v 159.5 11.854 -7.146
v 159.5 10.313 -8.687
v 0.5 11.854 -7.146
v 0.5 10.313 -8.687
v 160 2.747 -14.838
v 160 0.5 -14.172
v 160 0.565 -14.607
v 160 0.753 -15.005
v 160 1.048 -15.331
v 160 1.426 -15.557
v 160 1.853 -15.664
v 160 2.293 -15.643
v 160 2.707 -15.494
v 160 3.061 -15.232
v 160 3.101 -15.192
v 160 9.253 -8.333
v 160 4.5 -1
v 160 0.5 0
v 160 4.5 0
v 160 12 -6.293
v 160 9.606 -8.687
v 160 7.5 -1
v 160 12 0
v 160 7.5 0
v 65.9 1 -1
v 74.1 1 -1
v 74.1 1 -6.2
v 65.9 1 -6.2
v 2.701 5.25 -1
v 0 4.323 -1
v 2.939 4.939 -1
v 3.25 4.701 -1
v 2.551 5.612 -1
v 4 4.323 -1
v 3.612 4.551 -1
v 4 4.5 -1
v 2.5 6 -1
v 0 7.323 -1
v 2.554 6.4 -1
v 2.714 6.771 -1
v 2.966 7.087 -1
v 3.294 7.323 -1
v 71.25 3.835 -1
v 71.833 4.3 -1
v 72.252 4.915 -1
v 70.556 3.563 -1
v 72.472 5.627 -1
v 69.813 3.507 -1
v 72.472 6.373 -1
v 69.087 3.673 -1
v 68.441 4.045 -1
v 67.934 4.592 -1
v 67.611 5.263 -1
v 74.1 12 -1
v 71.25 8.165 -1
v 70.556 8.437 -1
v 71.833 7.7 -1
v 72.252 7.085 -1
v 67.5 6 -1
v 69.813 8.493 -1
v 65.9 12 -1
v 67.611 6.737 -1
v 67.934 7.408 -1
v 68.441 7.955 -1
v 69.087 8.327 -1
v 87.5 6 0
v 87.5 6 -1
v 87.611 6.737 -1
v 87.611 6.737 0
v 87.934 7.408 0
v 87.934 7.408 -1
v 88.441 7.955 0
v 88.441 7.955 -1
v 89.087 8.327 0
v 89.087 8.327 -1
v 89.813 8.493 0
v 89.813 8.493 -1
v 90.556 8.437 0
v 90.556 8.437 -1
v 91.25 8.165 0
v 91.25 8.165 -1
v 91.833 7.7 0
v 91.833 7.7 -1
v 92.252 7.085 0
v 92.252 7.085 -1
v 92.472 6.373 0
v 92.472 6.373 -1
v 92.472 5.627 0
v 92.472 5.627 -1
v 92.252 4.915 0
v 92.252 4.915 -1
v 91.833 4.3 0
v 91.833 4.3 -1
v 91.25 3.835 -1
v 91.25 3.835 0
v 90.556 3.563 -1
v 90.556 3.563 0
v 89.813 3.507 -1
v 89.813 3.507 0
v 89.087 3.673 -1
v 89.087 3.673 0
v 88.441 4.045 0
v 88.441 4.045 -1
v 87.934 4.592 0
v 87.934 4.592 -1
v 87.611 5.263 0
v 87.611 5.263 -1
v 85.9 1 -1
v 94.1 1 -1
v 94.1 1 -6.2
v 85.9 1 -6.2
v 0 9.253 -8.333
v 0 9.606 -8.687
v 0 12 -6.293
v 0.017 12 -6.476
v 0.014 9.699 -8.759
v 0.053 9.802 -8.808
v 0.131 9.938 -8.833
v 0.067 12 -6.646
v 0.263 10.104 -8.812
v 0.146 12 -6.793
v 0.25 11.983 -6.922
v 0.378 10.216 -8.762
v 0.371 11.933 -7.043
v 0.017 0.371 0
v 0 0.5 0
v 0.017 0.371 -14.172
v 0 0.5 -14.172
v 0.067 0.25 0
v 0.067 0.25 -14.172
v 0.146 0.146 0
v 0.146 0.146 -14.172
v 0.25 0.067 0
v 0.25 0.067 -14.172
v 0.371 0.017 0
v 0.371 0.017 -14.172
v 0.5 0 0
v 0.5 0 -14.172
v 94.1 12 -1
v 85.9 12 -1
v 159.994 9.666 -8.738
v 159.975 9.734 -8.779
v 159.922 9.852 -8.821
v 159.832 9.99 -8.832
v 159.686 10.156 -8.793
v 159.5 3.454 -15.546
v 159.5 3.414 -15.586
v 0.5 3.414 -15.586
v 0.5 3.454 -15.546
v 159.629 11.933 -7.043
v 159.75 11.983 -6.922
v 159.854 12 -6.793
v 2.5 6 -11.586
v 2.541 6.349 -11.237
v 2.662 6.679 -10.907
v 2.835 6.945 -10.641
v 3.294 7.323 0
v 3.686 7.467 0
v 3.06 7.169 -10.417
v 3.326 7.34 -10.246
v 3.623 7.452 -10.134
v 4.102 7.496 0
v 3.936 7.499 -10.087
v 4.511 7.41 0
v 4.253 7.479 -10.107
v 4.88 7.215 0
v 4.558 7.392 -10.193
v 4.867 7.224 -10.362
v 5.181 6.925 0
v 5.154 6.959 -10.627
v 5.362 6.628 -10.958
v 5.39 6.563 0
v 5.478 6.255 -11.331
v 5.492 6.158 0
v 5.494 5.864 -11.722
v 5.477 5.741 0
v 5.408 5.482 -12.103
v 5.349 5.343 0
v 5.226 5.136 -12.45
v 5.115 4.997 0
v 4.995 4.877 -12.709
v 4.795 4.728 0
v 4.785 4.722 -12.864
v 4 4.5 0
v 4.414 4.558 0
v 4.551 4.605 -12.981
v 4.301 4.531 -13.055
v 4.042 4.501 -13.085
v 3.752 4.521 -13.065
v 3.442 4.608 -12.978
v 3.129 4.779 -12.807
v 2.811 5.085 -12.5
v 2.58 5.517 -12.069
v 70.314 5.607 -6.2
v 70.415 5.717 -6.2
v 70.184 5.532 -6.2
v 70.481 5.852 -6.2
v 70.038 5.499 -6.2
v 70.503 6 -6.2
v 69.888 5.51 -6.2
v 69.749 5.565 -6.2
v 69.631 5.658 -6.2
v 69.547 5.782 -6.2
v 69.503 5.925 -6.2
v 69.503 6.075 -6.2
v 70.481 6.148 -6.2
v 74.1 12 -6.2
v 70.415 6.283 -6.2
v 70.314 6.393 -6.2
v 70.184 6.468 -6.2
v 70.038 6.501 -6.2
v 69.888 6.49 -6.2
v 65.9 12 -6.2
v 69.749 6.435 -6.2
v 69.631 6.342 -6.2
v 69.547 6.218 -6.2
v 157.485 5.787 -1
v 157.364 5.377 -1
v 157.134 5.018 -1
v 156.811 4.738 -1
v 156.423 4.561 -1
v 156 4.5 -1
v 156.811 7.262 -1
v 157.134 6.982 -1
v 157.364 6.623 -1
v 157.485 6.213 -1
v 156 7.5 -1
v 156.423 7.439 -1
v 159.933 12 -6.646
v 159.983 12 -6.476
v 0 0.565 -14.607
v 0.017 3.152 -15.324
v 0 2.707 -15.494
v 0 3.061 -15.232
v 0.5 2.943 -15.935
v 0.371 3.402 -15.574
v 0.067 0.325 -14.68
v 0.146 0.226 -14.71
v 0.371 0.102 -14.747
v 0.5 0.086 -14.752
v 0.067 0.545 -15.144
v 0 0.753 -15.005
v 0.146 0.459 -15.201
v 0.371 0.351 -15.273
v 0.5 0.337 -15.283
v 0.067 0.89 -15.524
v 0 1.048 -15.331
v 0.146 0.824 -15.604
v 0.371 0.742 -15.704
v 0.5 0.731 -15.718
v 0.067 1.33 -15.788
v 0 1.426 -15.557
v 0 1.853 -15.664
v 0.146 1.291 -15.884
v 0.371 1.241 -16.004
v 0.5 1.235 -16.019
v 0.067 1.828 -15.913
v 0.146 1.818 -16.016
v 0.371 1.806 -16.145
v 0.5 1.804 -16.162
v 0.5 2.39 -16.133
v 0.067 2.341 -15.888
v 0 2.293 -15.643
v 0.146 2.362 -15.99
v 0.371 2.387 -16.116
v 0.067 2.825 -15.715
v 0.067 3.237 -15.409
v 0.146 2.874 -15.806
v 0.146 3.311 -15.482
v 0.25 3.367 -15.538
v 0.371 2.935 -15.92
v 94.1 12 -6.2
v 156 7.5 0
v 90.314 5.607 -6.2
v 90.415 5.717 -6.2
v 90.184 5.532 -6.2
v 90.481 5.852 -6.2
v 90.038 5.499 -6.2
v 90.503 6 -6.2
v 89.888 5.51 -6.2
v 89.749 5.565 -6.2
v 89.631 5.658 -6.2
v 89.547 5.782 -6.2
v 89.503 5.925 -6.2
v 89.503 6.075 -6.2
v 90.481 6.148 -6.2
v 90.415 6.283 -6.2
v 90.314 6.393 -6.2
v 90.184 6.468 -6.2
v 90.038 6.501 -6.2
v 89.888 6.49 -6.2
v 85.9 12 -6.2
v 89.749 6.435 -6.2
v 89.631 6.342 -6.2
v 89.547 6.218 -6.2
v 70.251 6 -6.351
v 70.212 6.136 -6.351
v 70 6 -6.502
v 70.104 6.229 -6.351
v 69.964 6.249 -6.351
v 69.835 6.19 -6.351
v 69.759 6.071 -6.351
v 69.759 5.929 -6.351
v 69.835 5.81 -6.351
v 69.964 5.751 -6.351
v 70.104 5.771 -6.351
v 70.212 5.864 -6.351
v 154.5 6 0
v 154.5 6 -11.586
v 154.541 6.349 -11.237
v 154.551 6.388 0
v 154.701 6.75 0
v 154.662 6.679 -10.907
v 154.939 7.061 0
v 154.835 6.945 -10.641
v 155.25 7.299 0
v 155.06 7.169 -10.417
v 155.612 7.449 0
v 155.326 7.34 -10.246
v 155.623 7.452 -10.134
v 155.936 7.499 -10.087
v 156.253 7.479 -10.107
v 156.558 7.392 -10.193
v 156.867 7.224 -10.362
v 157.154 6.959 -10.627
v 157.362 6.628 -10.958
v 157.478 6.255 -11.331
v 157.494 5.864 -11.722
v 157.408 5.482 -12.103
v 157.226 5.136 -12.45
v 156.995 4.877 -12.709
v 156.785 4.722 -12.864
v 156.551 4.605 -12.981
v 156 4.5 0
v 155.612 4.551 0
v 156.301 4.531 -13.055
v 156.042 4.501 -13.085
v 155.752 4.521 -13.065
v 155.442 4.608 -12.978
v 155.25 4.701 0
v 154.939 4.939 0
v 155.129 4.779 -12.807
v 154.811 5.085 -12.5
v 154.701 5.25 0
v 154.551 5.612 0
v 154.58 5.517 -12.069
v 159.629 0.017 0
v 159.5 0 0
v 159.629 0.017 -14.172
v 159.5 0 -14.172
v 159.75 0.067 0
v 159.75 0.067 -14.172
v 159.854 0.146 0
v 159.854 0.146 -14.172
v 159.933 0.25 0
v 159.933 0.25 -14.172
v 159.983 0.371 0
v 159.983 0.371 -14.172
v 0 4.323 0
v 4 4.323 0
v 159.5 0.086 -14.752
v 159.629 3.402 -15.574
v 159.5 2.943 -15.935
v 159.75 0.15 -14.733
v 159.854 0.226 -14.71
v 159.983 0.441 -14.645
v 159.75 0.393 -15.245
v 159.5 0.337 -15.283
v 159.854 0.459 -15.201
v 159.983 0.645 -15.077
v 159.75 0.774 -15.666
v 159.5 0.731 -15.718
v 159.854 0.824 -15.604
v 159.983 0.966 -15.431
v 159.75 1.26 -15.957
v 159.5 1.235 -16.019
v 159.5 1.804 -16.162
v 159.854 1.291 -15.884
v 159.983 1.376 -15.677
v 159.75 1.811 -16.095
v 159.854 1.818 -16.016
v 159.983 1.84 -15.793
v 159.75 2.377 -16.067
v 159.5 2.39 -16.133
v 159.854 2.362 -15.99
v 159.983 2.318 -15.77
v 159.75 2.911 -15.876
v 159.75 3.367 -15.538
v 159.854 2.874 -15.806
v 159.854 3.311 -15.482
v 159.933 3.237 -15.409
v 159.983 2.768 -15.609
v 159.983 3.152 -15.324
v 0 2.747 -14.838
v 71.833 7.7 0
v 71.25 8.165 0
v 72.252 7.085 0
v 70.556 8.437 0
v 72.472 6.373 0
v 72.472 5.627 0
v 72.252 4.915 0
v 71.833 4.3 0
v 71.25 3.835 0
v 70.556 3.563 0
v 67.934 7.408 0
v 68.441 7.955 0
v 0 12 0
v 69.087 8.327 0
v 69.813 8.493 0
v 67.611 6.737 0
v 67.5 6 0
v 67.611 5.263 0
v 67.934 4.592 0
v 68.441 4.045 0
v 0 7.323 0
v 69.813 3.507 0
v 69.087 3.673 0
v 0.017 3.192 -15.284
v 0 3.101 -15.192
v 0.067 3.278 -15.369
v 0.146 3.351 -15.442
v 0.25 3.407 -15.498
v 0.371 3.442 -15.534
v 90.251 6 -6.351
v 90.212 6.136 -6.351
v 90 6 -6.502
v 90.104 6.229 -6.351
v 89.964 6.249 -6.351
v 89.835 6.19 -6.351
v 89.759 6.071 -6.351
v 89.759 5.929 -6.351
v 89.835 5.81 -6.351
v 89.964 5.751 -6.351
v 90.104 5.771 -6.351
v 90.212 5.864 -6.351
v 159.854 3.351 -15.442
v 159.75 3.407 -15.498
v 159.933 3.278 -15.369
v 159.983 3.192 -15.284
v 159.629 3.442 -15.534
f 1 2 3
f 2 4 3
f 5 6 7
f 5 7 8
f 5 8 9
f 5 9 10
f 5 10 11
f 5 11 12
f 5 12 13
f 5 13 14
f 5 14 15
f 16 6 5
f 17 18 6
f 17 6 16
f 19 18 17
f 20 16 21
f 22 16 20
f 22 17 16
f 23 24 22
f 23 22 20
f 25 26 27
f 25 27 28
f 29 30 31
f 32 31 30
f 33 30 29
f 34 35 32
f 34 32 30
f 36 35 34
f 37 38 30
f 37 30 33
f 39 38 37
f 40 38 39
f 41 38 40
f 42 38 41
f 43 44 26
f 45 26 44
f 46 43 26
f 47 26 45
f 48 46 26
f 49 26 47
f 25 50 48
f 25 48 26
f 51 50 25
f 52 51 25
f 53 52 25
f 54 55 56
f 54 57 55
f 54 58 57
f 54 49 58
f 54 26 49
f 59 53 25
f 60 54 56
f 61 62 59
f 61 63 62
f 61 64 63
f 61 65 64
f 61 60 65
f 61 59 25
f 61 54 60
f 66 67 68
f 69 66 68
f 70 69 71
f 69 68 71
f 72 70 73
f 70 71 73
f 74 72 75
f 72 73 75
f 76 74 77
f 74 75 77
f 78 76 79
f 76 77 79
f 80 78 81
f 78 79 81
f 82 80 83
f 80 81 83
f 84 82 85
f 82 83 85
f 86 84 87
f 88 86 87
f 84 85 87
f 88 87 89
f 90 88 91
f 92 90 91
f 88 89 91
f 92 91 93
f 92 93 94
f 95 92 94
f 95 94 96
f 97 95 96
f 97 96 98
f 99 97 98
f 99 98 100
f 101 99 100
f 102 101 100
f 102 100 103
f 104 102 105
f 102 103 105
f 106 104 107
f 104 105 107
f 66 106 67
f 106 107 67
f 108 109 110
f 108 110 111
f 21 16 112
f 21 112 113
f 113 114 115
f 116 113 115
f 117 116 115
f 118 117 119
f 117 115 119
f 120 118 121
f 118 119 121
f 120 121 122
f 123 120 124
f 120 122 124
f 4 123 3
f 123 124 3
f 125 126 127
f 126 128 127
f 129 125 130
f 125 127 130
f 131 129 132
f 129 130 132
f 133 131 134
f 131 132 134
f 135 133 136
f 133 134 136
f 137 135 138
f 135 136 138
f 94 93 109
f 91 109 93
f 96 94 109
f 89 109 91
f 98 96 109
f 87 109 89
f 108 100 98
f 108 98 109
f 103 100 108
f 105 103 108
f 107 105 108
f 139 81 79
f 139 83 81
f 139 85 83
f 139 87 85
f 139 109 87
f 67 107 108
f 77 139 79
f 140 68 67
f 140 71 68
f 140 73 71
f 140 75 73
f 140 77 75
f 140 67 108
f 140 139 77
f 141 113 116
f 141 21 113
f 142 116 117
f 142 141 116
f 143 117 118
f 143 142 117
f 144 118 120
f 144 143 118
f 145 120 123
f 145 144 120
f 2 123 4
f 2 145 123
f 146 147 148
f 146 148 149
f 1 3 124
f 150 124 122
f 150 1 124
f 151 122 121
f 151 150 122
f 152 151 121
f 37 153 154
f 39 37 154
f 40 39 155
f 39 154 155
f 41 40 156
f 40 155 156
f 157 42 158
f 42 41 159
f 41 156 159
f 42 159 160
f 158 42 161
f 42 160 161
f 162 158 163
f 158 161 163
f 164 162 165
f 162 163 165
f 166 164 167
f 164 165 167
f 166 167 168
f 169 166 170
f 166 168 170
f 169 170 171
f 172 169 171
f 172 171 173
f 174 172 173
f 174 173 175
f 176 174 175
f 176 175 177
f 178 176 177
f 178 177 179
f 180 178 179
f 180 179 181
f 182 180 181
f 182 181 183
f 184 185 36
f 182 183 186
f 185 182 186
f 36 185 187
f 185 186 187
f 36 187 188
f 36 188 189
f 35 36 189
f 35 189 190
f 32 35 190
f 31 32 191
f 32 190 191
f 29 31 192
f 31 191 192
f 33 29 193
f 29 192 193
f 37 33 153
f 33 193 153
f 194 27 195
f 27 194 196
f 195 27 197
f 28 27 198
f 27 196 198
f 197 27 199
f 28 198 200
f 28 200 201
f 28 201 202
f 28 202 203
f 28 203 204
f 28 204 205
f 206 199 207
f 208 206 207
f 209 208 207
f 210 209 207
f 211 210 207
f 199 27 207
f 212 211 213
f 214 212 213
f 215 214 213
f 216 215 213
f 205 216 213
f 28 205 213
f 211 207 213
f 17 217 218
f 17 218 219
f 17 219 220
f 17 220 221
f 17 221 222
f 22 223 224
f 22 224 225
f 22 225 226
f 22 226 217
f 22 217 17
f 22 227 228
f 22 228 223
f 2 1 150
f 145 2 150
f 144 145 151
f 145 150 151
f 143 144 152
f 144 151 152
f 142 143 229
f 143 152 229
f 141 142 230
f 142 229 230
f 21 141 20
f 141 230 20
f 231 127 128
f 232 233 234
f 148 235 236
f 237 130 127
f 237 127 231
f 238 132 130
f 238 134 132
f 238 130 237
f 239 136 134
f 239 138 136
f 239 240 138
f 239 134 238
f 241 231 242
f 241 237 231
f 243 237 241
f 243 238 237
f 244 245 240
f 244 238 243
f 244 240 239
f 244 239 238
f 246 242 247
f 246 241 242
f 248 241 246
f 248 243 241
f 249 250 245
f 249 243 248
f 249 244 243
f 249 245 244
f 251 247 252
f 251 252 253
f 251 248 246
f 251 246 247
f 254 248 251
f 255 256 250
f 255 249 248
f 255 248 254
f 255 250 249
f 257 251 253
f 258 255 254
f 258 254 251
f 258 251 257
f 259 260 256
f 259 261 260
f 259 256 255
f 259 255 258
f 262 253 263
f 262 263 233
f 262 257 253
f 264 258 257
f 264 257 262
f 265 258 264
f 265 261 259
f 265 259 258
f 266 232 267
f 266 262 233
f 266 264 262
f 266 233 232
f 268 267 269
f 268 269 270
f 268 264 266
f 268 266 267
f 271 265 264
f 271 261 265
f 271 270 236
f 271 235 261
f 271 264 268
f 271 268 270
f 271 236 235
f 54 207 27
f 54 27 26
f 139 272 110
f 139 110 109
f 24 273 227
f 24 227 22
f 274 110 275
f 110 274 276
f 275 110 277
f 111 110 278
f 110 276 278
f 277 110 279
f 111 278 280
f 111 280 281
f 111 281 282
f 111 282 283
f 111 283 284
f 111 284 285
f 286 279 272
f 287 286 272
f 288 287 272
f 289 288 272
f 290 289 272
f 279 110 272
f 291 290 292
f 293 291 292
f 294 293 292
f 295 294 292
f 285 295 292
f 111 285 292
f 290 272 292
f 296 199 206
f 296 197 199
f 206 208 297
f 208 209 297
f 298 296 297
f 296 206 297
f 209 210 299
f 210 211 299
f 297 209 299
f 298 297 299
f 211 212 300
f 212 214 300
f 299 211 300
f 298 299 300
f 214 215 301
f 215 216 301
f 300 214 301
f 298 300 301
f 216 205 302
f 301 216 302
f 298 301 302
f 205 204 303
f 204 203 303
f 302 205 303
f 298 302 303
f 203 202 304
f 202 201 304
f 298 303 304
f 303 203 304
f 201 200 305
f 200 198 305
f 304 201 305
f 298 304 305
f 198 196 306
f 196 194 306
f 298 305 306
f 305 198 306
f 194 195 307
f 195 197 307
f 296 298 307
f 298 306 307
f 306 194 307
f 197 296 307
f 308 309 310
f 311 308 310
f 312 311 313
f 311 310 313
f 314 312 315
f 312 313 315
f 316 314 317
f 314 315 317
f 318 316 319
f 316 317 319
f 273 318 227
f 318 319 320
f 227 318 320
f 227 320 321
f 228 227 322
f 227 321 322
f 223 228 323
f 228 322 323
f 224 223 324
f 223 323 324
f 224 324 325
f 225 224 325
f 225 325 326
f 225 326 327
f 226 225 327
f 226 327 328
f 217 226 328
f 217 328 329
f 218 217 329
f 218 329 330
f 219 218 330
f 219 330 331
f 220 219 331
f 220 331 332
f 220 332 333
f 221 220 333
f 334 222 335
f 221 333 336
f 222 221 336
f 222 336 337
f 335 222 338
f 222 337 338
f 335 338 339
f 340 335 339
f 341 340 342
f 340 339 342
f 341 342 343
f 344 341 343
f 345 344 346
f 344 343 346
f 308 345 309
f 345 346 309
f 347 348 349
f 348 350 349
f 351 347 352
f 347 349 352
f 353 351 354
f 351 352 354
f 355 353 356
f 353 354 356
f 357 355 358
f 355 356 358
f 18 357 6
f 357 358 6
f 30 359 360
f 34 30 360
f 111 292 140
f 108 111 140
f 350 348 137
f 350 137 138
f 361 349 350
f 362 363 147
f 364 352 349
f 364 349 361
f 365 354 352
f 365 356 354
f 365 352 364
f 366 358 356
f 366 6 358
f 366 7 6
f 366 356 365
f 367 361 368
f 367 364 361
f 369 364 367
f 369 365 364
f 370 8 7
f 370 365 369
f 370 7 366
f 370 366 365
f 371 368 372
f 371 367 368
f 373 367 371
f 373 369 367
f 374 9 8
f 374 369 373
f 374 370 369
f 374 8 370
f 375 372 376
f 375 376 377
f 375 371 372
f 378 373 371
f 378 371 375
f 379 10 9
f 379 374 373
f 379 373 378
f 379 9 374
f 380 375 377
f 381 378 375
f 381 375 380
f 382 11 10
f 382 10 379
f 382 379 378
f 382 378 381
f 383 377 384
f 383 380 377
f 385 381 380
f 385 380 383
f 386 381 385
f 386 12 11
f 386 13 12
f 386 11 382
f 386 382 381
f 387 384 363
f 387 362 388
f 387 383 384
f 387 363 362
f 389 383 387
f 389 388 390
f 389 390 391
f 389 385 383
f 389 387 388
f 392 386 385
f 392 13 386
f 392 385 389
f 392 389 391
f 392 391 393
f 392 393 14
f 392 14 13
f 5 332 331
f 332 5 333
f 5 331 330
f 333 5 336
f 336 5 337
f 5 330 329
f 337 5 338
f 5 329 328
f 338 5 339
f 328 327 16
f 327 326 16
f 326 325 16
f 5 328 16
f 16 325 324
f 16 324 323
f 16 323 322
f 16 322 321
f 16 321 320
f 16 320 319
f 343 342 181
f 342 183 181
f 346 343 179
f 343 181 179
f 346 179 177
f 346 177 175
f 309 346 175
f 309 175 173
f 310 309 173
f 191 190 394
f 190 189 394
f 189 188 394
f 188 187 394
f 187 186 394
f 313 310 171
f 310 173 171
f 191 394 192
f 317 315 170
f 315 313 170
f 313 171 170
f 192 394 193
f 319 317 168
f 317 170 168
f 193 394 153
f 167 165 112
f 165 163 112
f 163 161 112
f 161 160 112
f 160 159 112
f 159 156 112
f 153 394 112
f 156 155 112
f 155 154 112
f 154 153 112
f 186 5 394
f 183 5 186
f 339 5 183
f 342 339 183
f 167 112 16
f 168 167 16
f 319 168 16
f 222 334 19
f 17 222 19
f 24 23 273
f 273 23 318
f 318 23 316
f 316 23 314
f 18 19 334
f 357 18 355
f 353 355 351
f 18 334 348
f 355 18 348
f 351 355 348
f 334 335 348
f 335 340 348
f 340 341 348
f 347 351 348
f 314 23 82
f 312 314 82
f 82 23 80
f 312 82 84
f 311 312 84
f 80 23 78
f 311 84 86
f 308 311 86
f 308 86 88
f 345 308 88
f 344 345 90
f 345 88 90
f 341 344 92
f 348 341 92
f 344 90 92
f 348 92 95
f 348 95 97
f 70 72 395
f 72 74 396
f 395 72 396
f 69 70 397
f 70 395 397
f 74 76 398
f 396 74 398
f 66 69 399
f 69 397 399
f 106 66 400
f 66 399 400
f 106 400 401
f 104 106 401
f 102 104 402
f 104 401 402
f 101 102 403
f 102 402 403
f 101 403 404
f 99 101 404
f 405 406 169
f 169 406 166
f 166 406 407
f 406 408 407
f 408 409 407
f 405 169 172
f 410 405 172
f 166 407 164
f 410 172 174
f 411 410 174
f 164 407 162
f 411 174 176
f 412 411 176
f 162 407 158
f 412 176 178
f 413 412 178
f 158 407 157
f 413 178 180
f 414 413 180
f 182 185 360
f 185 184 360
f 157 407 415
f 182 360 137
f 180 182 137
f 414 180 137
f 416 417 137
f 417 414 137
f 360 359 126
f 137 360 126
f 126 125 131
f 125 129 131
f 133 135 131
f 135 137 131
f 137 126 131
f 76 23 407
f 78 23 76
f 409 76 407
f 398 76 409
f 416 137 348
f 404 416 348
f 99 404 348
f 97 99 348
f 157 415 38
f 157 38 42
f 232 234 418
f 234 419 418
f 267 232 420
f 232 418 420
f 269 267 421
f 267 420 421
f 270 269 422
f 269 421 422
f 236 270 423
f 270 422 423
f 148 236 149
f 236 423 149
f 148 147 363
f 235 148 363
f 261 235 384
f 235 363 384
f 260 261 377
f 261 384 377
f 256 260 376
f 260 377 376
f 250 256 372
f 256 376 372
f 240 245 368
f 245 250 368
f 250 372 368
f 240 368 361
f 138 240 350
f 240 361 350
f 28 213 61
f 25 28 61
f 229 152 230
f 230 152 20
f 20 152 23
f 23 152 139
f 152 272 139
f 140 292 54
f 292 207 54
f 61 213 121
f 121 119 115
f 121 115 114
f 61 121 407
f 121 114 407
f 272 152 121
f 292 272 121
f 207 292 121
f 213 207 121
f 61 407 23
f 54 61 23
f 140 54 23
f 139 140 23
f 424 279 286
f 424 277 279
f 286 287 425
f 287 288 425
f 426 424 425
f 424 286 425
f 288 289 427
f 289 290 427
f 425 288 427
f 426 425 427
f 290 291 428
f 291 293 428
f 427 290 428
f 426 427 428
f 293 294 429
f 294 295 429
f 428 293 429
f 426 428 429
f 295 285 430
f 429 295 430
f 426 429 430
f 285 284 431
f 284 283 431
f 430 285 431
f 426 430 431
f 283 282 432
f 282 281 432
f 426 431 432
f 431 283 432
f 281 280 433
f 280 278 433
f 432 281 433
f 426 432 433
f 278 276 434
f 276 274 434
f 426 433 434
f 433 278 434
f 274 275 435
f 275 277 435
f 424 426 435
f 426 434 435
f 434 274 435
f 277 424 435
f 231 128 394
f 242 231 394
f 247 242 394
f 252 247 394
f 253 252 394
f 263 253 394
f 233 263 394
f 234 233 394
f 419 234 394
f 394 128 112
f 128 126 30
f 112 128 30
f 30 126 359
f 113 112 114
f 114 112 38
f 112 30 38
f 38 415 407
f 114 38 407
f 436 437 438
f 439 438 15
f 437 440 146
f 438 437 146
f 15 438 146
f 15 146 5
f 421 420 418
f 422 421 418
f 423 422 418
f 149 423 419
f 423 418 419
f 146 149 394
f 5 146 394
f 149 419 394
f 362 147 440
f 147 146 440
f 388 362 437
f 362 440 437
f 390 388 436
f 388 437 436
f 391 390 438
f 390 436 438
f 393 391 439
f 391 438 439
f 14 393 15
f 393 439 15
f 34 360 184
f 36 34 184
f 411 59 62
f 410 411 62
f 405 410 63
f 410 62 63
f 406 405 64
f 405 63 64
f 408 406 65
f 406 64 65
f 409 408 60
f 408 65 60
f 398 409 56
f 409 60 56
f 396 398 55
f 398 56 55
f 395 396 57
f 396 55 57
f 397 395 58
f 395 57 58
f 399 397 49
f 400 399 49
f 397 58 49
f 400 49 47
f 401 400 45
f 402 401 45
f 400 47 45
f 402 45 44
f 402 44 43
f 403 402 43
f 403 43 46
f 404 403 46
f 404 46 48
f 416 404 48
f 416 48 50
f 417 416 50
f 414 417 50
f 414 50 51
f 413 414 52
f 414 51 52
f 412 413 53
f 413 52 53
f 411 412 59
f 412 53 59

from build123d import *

# Parameters (mm, degrees)
F1_DEPTH = 160
F3_D     = 5
F3_DEPTH = 5
F3_TIP   = 1.5021515476
F4_W     = 8.2
F4_H     = 5.2
F5_DEPTH = 11
F7_D     = 3
F6_W     = 4
F6_H     = 3
F8_DEPTH = 1
F9_R     = 2
F10_R    = 0.5


# Not quite as in the source:
# - a feature names something its author has since deleted; it is built from what else it names


with BuildPart() as f1:
    # F0 (on Right) → F1 (new body)
    with BuildSketch(Plane.YZ):
        Polygon((9.9597979746, -9.0402020254), (12, -7), (12, 0), (0, 0), (0, -6.5), (0, -19), (3.4544155877, -15.5455844123), (2.7473088065, -14.8384776311), (9.2526911935, -8.3330952442), align=None)
    extrude(amount=F1_DEPTH)

    # F3
    with Locations(Plane.XY):
        with Locations((90, 6), (70, 6)):
            Hole(F3_D / 2, depth=F3_DEPTH)
            with Locations((0, 0, -(F3_DEPTH + F3_TIP / 2))):  # 118° drill point
                Cone(0, F3_D / 2, F3_TIP, mode=Mode.SUBTRACT)

    # F4 (on face) → F5 (cut)
    with BuildSketch(Plane(origin=(0, 12, 0), x_dir=(-1, 0, 0), z_dir=(0, 1, 0))):
        with Locations((-90, -3.6)):
            Rectangle(F4_W, F4_H)
        with Locations((-70, -3.6)):
            Rectangle(F4_W, F4_H)
    extrude(amount=-F5_DEPTH, mode=Mode.SUBTRACT)

    # F7 (through all)
    with Locations(Plane.XY):
        with Locations((4, 6), (156, 6)):
            Hole(F7_D / 2)

    # F6 (on Top) → F8 (cut)
    with BuildSketch(Plane.XY):
        with Locations((158, 6)):
            Rectangle(F6_W, F6_H)
        with Locations((2, 5.8232012801)):
            Rectangle(F6_W, F6_H)
    extrude(amount=-F8_DEPTH, mode=Mode.SUBTRACT)

    # F9
    f9_edges = [f1.edges().sort_by_distance(p)[0] for p in [
        (80, 0, -19),
    ]]
    fillet(f9_edges, radius=F9_R)

    # F10
    f10_edges = [f1.edges().sort_by_distance(p)[0] for p in [
        (160, 10.979899, -8.020101),
        (0, 10.979899, -8.020101),
        (160, 3.434315, -15.565685),
        (0, 3.434315, -15.565685),
        (0, 1.234633, -16.019332),
        (0, 0, -7.085786),
        (160, 1.234633, -16.019332),
        (160, 0, -7.085786),
        (80, 9.959798, -9.040202),
        (80, 12, -7),
    ]]
    fillet(f10_edges, radius=F10_R)


solid = f1.part
